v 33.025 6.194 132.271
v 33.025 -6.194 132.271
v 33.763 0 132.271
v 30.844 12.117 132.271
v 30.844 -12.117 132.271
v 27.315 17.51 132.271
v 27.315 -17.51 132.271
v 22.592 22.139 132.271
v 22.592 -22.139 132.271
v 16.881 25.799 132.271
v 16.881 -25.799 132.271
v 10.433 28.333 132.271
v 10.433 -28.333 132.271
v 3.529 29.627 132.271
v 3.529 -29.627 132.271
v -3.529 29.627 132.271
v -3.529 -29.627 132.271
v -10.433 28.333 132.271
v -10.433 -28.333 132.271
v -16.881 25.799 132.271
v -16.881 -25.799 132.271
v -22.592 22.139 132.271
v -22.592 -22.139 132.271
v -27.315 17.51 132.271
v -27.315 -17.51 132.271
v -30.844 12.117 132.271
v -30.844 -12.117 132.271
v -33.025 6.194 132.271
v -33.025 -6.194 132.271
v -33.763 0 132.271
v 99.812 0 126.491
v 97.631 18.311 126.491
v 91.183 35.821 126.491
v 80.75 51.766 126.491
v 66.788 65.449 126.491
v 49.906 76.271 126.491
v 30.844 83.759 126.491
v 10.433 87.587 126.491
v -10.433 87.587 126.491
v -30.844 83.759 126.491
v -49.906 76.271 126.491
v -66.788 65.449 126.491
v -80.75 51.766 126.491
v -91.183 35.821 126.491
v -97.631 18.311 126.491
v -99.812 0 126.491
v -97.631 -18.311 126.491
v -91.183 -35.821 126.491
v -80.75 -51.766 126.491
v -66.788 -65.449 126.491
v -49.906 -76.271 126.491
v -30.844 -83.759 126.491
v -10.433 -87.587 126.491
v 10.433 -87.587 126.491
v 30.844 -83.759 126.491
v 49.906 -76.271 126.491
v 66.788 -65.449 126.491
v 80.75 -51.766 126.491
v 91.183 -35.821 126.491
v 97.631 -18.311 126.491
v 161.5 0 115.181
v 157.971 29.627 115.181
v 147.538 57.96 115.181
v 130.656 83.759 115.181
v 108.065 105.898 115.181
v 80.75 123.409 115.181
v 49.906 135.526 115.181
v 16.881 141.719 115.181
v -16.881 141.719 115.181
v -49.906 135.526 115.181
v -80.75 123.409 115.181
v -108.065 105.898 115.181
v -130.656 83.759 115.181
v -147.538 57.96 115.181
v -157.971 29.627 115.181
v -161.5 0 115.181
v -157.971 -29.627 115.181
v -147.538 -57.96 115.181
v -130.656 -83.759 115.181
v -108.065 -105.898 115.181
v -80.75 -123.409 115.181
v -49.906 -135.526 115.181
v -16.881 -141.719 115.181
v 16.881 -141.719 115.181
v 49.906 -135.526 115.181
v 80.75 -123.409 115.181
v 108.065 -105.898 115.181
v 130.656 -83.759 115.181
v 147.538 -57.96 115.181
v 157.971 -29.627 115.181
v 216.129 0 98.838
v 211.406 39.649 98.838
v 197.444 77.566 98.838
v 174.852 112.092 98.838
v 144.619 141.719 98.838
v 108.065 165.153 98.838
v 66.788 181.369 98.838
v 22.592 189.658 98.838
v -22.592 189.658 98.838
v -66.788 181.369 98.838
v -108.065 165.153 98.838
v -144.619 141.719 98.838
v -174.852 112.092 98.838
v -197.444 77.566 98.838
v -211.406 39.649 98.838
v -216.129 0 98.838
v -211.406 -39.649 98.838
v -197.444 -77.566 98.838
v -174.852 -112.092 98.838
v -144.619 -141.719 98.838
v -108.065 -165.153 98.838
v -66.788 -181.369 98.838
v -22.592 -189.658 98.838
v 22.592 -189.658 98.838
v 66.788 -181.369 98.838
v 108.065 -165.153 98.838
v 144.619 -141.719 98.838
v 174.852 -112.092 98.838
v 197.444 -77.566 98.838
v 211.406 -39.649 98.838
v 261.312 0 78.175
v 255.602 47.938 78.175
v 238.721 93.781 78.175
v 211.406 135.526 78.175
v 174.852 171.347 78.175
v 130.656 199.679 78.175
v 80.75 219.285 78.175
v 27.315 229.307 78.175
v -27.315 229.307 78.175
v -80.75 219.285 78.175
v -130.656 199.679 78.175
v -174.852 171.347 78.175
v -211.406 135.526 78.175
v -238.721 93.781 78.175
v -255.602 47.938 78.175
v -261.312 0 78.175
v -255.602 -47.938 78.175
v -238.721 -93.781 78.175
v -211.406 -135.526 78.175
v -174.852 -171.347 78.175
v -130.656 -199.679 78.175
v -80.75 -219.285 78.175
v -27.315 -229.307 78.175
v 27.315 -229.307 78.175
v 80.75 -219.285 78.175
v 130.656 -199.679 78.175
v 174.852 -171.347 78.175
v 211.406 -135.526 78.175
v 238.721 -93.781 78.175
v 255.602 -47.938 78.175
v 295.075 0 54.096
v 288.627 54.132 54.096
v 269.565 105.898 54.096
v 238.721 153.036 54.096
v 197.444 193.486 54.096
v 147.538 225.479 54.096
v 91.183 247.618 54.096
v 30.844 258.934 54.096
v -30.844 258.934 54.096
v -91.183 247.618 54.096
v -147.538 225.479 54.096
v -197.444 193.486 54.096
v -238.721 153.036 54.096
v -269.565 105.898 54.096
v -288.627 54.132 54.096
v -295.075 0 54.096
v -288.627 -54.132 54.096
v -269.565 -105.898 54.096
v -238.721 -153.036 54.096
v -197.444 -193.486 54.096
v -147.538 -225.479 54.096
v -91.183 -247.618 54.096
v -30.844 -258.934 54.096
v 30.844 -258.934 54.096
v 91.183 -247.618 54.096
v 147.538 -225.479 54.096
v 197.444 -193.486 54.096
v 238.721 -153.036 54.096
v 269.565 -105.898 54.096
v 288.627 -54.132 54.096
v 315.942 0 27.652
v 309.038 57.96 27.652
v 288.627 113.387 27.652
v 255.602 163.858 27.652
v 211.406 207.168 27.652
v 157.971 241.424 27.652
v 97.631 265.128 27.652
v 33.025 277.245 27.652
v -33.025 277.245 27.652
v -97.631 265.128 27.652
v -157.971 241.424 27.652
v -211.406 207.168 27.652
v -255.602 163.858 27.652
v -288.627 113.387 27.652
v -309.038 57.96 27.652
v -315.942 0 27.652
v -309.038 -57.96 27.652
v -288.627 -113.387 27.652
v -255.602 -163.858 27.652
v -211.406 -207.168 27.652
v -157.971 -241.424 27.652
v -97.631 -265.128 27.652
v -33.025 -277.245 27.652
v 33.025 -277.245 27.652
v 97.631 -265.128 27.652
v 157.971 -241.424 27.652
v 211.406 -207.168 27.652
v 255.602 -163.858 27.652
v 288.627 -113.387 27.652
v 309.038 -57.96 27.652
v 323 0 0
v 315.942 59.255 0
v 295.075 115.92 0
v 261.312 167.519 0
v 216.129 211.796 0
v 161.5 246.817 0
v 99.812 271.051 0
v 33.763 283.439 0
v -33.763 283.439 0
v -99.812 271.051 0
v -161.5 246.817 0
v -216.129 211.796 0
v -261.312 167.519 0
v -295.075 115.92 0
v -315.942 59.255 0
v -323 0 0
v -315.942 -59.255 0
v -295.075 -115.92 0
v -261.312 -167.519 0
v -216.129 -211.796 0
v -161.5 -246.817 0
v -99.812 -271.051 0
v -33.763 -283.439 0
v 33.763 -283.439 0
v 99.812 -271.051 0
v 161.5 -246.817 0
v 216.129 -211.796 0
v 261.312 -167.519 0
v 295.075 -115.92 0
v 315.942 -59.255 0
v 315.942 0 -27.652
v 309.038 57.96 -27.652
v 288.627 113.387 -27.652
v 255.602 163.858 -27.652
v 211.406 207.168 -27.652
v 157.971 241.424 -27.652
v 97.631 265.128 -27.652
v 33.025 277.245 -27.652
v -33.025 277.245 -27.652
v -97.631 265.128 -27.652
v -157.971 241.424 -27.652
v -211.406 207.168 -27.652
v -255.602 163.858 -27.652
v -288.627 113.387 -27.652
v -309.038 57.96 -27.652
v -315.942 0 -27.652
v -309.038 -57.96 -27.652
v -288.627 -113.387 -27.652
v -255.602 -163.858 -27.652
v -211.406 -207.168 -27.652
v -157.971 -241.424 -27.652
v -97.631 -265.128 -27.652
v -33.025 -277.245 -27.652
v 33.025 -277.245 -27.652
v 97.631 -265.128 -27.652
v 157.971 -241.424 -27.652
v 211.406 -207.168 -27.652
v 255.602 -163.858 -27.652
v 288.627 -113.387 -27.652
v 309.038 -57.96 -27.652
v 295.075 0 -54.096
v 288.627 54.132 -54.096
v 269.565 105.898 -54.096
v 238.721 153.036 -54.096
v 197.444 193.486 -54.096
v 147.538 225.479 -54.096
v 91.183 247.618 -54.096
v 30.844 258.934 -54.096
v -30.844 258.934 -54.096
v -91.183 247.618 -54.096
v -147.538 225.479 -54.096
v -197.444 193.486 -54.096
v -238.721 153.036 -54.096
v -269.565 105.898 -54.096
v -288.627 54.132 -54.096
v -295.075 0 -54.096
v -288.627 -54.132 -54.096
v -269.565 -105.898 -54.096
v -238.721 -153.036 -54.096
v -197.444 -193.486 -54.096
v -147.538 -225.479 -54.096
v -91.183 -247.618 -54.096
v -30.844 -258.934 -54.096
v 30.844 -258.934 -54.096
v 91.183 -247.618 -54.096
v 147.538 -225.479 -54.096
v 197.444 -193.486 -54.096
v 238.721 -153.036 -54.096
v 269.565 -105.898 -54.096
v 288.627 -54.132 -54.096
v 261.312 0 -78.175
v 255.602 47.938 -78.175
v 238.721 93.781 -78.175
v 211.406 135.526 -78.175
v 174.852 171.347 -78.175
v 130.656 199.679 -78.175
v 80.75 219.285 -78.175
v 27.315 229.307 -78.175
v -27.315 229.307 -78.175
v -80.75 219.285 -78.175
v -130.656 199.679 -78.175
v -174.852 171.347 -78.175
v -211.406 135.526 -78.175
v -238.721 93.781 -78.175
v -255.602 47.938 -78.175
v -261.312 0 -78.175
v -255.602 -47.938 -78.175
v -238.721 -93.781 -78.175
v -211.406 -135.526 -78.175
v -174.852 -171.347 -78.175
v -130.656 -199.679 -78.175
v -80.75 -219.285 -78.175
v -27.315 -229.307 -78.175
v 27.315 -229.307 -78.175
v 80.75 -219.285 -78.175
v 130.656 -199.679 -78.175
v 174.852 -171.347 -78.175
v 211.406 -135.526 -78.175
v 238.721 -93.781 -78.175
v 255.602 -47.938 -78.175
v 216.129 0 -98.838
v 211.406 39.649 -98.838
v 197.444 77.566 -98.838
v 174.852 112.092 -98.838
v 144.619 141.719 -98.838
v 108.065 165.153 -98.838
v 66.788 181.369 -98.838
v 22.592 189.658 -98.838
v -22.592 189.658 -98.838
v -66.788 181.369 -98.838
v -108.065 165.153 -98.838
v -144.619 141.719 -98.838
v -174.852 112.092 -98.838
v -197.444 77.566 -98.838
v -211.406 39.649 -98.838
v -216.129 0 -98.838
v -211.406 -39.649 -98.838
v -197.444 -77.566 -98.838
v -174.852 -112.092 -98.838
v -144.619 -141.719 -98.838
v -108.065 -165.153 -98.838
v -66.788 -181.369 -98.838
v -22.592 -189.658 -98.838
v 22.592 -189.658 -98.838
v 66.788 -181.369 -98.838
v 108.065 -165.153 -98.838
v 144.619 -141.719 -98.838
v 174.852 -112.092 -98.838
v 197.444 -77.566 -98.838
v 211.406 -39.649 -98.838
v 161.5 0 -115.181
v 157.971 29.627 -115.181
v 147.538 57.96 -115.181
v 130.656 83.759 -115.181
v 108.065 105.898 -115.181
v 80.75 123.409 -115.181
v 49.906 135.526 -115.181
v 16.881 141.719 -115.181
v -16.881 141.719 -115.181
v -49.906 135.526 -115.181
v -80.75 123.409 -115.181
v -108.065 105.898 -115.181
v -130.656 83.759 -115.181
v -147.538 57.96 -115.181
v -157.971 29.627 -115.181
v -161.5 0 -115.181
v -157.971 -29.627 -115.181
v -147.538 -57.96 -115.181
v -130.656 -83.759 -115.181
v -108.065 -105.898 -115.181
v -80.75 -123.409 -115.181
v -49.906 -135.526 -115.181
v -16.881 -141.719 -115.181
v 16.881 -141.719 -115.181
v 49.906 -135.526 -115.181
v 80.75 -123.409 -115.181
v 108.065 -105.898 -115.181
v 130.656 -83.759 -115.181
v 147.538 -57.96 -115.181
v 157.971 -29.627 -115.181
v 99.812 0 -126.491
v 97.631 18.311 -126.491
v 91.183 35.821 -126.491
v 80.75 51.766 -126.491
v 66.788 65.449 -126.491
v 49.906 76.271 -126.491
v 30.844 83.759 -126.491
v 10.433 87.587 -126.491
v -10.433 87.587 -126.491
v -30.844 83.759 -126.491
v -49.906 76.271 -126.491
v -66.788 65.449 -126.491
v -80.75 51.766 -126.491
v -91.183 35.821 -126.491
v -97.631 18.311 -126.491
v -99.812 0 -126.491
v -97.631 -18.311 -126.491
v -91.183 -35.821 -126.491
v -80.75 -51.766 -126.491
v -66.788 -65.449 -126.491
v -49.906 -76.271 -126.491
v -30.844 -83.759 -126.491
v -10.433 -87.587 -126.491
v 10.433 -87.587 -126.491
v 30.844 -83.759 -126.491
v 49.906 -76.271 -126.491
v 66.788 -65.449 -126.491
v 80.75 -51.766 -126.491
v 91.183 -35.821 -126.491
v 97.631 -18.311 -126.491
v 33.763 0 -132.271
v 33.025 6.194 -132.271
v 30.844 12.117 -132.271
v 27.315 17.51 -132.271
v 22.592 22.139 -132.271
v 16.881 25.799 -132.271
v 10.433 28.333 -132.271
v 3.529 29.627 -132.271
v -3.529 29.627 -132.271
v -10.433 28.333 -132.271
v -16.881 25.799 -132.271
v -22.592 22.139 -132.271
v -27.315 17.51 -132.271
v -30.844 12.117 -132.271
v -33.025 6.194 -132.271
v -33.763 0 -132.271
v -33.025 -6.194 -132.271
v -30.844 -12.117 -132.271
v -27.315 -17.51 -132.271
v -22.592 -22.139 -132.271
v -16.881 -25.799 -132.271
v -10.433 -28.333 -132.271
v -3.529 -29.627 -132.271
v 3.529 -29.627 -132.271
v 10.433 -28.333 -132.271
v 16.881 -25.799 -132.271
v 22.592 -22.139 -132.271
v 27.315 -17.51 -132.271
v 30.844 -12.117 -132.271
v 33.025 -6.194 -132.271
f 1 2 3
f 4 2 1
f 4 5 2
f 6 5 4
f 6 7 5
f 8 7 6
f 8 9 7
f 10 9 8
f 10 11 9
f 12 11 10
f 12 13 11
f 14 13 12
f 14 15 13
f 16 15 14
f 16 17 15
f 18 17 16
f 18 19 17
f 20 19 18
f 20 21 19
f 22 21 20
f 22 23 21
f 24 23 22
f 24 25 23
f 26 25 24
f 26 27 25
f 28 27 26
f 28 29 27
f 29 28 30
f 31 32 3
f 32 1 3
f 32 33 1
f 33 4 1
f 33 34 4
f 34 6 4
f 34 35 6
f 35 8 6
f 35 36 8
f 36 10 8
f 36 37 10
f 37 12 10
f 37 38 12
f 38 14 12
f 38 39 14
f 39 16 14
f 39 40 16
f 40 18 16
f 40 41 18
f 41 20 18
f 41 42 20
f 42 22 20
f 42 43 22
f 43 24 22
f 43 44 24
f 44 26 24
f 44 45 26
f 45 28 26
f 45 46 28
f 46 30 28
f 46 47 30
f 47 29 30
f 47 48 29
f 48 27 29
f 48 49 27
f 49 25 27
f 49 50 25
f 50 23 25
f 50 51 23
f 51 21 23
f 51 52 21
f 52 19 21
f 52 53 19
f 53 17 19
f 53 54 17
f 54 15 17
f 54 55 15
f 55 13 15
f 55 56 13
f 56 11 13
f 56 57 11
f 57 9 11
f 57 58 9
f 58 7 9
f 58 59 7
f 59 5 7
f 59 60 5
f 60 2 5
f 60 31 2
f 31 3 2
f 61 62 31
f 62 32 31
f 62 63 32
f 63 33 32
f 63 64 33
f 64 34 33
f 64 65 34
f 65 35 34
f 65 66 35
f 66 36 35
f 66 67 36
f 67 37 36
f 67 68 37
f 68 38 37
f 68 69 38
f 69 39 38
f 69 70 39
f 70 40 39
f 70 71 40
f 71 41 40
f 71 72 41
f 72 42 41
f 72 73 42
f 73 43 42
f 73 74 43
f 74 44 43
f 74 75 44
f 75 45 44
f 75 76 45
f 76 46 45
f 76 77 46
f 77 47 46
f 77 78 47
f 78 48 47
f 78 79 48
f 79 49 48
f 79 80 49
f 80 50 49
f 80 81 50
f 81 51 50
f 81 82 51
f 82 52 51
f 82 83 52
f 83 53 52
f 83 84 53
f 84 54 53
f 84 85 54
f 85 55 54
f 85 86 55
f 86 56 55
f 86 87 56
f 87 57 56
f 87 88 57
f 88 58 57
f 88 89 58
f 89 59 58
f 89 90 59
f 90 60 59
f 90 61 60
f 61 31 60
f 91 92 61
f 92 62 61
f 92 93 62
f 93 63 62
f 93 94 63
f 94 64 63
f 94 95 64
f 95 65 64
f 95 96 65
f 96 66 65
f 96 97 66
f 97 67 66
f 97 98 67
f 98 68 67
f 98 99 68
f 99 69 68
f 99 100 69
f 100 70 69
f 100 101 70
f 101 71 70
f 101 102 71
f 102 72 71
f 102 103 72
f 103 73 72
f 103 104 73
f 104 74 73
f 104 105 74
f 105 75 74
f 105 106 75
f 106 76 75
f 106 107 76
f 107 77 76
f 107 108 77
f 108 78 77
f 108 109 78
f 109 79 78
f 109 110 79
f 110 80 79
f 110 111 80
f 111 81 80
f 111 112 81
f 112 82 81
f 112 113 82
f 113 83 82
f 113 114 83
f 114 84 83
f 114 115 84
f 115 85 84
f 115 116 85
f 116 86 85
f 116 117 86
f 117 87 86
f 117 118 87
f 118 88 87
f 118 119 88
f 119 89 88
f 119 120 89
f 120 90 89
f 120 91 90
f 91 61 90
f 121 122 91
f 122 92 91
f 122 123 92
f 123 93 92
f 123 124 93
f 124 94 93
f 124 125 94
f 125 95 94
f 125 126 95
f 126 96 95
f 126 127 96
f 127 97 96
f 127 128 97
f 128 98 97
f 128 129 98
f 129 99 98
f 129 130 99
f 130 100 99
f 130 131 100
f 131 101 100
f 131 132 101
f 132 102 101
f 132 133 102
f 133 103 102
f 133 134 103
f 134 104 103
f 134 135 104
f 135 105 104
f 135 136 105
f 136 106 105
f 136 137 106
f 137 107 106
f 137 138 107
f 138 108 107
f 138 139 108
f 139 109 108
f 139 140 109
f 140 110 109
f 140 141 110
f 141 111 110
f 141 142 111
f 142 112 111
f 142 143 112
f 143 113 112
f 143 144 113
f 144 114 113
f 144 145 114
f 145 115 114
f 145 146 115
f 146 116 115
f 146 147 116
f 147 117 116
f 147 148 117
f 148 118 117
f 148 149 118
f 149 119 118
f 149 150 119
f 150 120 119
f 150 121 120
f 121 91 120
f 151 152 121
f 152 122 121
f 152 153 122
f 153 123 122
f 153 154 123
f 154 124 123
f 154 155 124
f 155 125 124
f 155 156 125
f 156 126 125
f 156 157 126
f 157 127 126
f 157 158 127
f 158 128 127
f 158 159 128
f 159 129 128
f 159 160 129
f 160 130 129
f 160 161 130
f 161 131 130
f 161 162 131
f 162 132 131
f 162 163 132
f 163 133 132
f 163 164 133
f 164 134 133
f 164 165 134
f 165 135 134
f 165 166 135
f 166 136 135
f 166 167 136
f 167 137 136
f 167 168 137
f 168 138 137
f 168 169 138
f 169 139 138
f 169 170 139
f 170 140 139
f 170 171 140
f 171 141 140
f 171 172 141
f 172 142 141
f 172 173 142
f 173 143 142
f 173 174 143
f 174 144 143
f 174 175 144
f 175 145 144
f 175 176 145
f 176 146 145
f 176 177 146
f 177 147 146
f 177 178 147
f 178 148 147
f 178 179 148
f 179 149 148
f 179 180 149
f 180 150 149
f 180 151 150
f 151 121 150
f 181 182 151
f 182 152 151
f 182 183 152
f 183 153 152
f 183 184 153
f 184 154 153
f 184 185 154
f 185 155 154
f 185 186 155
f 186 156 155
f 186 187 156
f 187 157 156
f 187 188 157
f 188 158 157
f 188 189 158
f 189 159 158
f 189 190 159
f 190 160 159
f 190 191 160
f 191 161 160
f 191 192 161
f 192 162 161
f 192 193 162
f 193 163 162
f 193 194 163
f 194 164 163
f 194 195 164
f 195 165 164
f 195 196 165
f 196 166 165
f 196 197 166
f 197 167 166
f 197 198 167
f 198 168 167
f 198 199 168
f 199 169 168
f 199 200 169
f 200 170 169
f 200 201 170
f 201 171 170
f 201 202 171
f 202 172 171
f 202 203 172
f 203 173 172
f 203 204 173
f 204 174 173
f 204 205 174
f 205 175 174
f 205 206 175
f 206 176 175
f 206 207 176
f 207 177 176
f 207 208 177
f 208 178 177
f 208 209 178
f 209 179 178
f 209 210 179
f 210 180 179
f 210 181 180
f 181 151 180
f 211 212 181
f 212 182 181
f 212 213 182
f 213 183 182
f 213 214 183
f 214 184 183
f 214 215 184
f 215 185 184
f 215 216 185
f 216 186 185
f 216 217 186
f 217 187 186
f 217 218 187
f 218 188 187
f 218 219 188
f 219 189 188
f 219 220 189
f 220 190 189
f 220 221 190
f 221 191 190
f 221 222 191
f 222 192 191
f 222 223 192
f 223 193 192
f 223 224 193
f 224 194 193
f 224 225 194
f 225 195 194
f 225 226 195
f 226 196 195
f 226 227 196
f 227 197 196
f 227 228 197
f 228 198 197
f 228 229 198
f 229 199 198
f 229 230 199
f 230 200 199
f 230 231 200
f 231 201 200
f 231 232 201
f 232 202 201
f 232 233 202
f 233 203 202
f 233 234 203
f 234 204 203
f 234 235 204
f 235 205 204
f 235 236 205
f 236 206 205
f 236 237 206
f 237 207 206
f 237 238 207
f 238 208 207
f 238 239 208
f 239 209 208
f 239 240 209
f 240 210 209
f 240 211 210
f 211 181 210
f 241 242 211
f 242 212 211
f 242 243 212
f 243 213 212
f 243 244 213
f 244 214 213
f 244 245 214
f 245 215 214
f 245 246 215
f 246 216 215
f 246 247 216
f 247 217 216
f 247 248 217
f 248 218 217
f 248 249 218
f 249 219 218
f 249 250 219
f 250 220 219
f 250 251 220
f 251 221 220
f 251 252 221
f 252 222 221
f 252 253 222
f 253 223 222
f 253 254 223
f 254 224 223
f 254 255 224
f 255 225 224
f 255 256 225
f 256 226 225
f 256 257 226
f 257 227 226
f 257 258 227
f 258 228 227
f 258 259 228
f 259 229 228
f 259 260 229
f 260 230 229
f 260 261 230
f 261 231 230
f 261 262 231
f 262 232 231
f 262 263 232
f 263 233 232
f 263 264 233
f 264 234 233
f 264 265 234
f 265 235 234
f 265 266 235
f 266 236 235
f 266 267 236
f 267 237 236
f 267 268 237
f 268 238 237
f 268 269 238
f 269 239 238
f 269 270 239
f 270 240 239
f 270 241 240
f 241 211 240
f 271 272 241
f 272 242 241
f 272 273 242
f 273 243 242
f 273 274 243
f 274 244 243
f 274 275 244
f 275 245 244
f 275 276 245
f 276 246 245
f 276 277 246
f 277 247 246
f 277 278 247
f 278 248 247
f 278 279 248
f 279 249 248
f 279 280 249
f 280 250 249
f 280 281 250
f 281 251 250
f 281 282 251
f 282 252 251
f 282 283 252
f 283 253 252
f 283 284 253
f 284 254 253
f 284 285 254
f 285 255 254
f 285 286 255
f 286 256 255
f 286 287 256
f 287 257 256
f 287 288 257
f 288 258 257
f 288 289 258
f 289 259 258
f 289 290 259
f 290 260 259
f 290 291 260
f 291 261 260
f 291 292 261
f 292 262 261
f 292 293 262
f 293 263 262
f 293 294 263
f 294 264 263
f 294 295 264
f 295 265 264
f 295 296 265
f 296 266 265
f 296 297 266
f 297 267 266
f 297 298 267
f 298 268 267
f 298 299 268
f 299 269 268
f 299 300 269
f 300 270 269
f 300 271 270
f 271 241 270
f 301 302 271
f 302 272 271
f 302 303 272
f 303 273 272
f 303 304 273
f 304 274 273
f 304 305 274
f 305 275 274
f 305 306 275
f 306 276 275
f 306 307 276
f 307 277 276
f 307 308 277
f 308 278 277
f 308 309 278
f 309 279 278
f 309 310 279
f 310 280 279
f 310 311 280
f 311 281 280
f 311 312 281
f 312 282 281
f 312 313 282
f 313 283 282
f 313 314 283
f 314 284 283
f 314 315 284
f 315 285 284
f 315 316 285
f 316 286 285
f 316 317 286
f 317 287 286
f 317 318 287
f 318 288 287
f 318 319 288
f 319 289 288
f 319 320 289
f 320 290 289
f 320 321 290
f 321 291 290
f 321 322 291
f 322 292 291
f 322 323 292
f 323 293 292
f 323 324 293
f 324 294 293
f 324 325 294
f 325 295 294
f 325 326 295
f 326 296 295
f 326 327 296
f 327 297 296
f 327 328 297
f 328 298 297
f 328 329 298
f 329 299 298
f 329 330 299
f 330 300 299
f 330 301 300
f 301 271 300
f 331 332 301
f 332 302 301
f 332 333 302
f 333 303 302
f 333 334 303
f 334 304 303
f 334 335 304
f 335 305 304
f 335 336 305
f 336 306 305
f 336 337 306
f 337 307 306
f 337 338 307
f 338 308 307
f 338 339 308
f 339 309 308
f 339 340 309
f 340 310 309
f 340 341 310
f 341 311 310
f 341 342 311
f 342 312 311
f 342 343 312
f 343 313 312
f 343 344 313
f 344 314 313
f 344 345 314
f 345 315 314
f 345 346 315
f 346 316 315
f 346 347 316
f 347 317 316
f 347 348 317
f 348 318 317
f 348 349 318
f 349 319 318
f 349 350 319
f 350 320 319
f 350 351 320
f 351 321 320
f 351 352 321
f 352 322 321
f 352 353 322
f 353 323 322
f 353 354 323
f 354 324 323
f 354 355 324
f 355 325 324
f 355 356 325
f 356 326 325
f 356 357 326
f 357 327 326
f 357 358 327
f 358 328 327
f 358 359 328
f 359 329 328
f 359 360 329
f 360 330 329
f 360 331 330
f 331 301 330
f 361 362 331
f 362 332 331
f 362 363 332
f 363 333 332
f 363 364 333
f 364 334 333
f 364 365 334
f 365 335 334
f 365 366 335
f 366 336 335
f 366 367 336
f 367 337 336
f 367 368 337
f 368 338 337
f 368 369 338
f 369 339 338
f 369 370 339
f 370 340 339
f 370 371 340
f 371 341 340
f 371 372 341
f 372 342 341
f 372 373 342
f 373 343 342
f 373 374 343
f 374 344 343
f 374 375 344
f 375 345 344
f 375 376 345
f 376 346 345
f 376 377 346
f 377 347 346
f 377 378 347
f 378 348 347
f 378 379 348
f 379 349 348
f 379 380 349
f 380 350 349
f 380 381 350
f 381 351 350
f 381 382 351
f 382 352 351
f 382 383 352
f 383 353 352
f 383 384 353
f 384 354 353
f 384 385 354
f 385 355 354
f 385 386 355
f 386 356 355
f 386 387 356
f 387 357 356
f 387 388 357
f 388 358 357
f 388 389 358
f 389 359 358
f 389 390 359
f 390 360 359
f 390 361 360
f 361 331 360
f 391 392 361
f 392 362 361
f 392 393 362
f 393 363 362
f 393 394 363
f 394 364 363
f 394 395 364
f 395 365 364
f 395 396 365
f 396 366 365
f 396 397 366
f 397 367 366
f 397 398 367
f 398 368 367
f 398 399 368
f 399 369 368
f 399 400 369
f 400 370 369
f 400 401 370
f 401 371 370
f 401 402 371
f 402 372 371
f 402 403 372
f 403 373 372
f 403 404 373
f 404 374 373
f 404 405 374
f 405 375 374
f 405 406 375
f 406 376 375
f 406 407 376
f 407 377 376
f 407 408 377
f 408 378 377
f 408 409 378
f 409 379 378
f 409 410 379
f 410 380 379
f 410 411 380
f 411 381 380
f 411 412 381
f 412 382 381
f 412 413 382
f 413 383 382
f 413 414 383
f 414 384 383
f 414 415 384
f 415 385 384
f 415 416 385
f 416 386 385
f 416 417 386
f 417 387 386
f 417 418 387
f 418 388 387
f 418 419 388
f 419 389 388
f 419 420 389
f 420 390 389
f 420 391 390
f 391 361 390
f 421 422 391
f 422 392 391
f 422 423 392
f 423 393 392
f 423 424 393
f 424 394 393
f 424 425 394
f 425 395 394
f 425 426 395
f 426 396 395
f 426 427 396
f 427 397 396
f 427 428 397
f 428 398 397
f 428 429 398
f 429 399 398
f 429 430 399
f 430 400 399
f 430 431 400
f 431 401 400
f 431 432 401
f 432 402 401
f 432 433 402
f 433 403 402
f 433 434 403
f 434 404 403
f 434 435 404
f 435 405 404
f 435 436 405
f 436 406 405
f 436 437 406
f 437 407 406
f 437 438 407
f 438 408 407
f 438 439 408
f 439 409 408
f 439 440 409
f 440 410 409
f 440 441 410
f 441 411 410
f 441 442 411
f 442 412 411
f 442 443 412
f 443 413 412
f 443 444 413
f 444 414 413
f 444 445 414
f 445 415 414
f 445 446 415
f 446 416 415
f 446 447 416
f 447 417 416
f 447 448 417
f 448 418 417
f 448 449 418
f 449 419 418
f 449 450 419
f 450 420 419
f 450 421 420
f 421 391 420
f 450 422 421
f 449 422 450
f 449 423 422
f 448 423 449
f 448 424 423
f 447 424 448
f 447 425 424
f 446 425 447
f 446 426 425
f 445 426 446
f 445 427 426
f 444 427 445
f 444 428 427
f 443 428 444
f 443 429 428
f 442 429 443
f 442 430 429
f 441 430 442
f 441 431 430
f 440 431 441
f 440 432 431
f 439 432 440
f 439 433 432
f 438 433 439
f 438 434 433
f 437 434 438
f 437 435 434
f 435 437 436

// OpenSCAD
// Generated by SolidPython 1.0.1 on 2020-07-29 00:46:53


scale(v = [17, 15, 7]) {
	sphere(r = 19);
}
/***********************************************
*********      SolidPython code:      **********
************************************************
 
# import packages: SolidPython
from solid import *
from solid.utils import *
from itertools import chain, combinations, permutations


class Resize:

    def __init__(self, scad_file):
        self.scad_file = scad_file
        #self.scad_file = import_scad(scad_file)
        # cone/cylinder param:
        self.r1 = 0
        self.r2 = 0
        self.h = 0
        # rectangular prism param:
        self.w = 0
        self.l = 0
        # ellipse param:
        self.r = 0

    # import OpenScad code (file name corresponds to shape)


    # classify shape + parameters
    def assign(self, param1, param2, param3):
        if self.scad_file == 'cone.scad':
            self.r1 = param1
            self.r2 = param2
            self.h = param3
        elif self.scad_file == 'cylinder.scad':
            self.r1 = param1
            self.r2 = param2
            self.h = param3
        elif self.scad_file == 'rectangularPrism.scad':
            self.h = param1
            self.l = param2
            self.w = param3
        else:
            self.r = param1
            self.h = param2

    # resize parameters
    def iterate(self):
        x = range(3, 20, 2)
        i = 1
        if self.scad_file == 'cone.scad':
            tempList = list(permutations(x, 2))
            for temp in tempList:
                param1 = temp[0]
                param2 = temp[1]
                filepath = 'produced_scad_files/' + 'cone' + str(param1) + '_' + str(param2) + '_' + '.scad'
                scad_render_to_file(cylinder(h=param1, r1=param2, r2=0), filepath)

        elif self.scad_file == 'cylinder.scad':
            tempList = list(permutations(x, 3))
            for temp in tempList:
                param1 = temp[0]
                param2 = temp[1]
                filepath = 'produced_scad_files/' + 'cylinder' + str(param1) + '_' + str(param2) + '_' + '.scad'
                scad_render_to_file(cylinder(h=param1, r1=param2, r2=param2), filepath)

        elif self.scad_file == 'rectangularPrism.scad':
            tempList = list(permutations(x, 3))
            for temp in tempList:
                param1 = temp[0]
                param2 = temp[1]
                param3 = temp[2]
                filepath = 'produced_scad_files/' + 'rectangularPrism' + str(param1) + '_' + str(param2) + '_' + str(
                    param3) + '.scad'
                scad_render_to_file(cube(size=(param1, param2, param3)), filepath)

        elif self.scad_file == 'ellipse.scad':
            tempList = list(permutations(x, 4))
            for temp in tempList:
                param1 = temp[0]
                param2 = temp[1]
                param3 = temp[2]
                param4 = temp[3]
                filepath = 'produced_scad_files/' + 'ellipse' + str(param1) + '_' + str(param2) + '_' + str(param3) + '_' + str(param4) + '.scad'
                scad_render_to_file(scale([param1, param2, param3])(sphere(r=param4)), filepath)

    def render_to_scadfile(self):
        scad_render_to_file(scad, 'example.scad') 
 
************************************************/
